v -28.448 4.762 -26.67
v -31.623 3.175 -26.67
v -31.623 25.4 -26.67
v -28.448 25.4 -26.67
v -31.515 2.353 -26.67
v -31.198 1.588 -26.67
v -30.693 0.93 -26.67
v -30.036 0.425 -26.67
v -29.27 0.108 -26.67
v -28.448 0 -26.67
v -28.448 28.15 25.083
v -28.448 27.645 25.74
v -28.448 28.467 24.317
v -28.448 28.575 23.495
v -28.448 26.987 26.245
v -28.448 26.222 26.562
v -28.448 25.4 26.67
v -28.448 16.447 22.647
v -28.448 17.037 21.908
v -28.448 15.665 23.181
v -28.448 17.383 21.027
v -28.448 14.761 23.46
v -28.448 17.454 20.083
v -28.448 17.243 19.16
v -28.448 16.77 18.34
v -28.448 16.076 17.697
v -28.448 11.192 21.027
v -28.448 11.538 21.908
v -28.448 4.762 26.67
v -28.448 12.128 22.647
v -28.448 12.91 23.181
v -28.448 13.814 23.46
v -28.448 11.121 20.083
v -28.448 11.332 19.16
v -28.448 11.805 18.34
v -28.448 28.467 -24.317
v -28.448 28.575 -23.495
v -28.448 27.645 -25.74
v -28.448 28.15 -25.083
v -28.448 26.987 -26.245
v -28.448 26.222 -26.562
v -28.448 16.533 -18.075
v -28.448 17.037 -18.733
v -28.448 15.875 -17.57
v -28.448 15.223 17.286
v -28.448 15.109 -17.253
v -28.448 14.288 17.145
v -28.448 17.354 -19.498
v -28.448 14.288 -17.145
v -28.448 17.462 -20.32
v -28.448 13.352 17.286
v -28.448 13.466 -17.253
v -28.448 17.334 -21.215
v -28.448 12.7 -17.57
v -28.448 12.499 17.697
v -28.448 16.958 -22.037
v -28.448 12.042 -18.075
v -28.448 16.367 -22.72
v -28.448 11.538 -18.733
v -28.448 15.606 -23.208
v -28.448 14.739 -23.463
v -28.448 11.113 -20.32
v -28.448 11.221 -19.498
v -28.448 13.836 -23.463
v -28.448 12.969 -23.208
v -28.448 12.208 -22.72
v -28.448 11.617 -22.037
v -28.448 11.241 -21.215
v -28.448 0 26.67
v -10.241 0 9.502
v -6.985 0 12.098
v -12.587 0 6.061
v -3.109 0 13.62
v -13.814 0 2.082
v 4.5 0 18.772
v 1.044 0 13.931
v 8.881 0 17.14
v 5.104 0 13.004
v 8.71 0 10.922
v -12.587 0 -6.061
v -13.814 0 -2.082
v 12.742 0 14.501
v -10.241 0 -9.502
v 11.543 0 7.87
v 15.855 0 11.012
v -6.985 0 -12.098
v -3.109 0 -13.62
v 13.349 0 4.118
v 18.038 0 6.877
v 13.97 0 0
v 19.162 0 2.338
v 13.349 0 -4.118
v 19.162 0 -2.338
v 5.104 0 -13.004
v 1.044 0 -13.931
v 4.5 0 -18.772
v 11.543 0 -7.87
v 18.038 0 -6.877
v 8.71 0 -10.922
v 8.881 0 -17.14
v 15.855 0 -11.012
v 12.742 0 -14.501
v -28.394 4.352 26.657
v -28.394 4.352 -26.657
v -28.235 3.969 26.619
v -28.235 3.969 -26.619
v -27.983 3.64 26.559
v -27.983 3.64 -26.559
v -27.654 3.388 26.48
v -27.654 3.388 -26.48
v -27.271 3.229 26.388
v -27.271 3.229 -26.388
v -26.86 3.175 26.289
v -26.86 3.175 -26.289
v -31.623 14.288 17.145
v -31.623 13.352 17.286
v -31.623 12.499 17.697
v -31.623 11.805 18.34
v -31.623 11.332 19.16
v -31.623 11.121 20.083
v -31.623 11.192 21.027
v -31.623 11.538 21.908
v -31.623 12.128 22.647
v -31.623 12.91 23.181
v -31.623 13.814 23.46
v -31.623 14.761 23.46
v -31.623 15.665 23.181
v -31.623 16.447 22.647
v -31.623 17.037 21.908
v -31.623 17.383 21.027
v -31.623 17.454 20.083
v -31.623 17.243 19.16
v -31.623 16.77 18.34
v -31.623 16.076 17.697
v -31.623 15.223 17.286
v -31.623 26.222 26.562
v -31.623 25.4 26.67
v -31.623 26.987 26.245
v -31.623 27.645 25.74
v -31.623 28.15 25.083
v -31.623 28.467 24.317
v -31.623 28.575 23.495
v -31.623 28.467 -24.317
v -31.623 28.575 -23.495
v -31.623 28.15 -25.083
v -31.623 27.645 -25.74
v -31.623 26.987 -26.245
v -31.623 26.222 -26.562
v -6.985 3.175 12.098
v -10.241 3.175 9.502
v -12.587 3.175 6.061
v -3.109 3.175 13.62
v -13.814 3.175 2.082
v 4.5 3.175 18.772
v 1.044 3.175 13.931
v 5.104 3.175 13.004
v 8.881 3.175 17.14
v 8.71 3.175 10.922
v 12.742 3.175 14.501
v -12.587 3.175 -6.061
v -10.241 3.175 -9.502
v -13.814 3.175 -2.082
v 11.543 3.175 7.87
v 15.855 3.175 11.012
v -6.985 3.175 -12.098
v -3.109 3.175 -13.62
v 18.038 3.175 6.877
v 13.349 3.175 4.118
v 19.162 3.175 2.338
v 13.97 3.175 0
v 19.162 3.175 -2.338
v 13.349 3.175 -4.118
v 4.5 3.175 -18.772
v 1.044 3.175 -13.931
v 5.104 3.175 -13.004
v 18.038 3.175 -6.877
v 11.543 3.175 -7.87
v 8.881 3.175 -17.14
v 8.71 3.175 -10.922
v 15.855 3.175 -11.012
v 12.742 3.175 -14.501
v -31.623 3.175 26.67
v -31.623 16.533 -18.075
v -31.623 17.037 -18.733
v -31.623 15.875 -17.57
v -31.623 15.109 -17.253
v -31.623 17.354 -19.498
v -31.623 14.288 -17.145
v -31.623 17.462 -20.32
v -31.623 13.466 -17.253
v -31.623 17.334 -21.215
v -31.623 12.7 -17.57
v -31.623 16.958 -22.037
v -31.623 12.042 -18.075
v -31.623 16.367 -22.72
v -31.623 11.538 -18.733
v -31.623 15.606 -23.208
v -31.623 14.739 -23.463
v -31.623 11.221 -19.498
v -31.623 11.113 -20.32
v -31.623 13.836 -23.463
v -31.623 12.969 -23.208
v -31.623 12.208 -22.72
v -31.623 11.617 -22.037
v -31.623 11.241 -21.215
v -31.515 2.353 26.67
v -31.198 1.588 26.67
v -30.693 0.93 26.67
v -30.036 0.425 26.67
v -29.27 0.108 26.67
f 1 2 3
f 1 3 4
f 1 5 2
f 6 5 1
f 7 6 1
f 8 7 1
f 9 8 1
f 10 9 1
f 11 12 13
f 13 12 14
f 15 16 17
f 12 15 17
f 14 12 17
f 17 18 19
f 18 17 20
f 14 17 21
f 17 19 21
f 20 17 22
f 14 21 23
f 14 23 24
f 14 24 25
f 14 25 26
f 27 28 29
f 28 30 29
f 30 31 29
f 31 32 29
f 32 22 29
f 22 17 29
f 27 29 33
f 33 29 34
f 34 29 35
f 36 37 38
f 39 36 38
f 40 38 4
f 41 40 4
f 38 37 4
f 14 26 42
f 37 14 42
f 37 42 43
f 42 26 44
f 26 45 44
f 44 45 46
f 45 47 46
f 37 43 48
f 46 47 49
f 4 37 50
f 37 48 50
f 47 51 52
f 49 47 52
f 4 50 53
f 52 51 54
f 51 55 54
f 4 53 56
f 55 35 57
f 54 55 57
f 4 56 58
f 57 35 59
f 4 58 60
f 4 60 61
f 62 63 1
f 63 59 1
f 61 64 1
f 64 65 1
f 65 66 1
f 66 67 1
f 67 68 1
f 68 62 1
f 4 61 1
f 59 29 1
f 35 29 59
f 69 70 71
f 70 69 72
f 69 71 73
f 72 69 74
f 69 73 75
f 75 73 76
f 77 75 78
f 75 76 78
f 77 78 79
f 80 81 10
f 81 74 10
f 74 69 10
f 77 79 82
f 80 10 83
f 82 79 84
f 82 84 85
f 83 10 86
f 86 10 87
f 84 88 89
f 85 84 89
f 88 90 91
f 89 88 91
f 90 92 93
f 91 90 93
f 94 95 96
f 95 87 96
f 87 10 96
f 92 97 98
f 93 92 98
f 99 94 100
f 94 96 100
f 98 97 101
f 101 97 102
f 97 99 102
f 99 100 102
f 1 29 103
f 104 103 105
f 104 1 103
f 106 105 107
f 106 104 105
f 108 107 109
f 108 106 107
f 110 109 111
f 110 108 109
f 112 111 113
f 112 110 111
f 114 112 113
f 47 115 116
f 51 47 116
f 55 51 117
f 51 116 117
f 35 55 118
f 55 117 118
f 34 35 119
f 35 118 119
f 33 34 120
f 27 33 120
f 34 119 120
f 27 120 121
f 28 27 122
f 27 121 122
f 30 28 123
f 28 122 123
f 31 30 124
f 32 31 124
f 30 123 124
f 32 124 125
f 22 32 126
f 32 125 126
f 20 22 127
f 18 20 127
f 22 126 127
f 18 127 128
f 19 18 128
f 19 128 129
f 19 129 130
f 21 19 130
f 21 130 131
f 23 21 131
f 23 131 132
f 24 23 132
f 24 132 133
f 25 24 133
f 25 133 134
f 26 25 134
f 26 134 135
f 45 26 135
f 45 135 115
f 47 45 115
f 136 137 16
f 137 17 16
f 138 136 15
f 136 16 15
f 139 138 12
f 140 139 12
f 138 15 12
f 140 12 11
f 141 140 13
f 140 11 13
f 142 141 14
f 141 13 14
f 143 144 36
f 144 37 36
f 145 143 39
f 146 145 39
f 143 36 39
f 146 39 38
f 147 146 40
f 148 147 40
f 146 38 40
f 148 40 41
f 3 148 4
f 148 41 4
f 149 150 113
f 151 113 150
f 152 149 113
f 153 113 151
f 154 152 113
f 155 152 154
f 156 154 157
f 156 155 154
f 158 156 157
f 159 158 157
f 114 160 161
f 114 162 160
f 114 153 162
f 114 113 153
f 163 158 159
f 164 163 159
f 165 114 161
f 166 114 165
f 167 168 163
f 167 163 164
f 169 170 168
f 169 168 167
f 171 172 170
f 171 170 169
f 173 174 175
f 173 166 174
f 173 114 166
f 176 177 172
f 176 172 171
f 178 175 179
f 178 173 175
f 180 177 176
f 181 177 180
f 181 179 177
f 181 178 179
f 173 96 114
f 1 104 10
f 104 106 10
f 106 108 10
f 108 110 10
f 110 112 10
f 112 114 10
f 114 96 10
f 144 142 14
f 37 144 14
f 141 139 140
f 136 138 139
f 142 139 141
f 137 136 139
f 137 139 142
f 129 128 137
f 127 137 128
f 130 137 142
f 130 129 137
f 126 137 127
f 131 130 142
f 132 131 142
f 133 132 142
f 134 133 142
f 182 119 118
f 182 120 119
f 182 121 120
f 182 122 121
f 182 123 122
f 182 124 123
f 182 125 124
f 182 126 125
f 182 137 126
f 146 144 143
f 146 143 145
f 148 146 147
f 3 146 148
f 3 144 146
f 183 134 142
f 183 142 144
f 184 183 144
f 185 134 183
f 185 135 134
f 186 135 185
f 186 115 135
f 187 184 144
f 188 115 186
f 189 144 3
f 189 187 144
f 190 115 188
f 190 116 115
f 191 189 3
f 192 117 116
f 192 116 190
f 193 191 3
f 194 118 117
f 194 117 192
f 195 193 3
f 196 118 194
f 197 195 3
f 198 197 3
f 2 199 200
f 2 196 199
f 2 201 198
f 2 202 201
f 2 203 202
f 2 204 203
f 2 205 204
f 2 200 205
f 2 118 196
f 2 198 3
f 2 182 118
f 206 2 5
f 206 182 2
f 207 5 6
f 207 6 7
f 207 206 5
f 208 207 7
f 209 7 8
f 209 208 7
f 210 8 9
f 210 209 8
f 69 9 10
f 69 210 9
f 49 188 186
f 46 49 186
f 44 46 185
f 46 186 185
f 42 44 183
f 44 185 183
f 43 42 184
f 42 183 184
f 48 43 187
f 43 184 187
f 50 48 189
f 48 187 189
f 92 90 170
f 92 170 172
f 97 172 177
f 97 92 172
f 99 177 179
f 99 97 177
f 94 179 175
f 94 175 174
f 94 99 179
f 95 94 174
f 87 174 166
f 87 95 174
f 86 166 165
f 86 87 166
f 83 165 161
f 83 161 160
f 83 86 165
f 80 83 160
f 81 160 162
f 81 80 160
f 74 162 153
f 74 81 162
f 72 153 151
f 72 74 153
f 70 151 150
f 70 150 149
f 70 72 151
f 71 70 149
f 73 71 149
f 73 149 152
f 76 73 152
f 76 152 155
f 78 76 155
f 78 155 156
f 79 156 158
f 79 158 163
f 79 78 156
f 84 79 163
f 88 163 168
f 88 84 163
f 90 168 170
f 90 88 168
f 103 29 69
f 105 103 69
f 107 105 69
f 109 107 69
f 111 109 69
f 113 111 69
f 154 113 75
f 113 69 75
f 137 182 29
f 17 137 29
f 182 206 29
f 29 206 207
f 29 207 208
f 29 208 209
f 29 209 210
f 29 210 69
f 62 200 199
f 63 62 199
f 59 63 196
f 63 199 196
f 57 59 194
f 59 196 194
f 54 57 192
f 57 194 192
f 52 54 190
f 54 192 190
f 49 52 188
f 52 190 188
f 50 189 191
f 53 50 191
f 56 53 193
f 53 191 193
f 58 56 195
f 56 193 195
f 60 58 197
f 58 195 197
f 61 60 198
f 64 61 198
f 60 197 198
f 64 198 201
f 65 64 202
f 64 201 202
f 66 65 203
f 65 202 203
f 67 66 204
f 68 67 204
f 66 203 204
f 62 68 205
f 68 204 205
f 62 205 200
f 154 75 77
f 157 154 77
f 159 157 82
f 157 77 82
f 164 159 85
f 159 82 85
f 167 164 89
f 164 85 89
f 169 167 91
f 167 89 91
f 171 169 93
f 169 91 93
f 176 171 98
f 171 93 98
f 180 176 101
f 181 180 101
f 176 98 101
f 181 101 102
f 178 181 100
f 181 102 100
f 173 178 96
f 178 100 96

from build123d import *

# Parameters (mm, degrees)
SKETCH1_R           = 13.97
BOSS_EXTRUDE1_DEPTH = 3.175
SKETCH2_W           = 3.175
SKETCH2_H           = 53.34
BOSS_EXTRUDE2_DEPTH = 25.4
CUT_EXTRUDE1_DEPTH  = 51.927
FILLET1_R           = 1.5875
FILLET2_R           = 3.175
FILLET3_R           = 3.175


with BuildPart() as part:
    # Sketch1 → Boss-Extrude1 (new body)
    with BuildSketch(Plane(origin=(0, 0, 0), x_dir=(1, 0, 0), z_dir=(0, 1, 0))):
        with BuildLine():
            ThreePointArc((4.499810369, -18.772216775), (19.304, 0), (4.499810369, 18.772216775))
            Line((4.499810369, 18.772216775), (-28.448, 26.67))
            Line((-28.448, 26.67), (-31.623, 26.67))
            Line((-31.623, 26.67), (-31.623, -26.67))
            Line((-31.623, -26.67), (-28.448, -26.67))
            Line((-28.448, -26.67), (4.499810369, -18.772216775))
        make_face()
        Circle(SKETCH1_R, mode=Mode.SUBTRACT)
    extrude(amount=BOSS_EXTRUDE1_DEPTH)

    # Sketch2 → Boss-Extrude2 (add)
    with BuildSketch(Plane(origin=(0, 3.175, 0), x_dir=(1, 0, 0), z_dir=(0, 1, 0))):
        with Locations((-30.0355, 0)):
            Rectangle(SKETCH2_W, SKETCH2_H)
    extrude(amount=BOSS_EXTRUDE2_DEPTH)

    # Sketch6 → Cut-Extrude1 (cut, through all)
    with BuildSketch(Plane.ZY.offset(31.623)):
        with BuildLine():
            Line((-20.32, 11.1125), (-20.32, 14.2875))
            Line((-20.32, 14.2875), (-20.32, 17.4625))
            ThreePointArc((-20.32, 17.4625), (-23.495, 14.2875), (-20.32, 11.1125))
        make_face()
        with BuildLine():
            ThreePointArc((-20.32, 11.1125), (-18.07493597, 12.04243597), (-17.145, 14.2875))
            Line((-17.145, 14.2875), (-20.32, 14.2875))
            Line((-20.32, 14.2875), (-20.32, 11.1125))
        make_face()
        with BuildLine():
            Line((-20.32, 14.2875), (-17.145, 14.2875))
            ThreePointArc((-17.145, 14.2875), (-18.07493597, 16.53256403), (-20.32, 17.4625))
            Line((-20.32, 17.4625), (-20.32, 14.2875))
        make_face()
        with BuildLine():
            ThreePointArc((23.495, 14.2875), (20.32, 17.4625), (17.145, 14.2875))
            Line((17.145, 14.2875), (20.32, 14.2875))
            Line((20.32, 14.2875), (23.495, 14.2875))
        make_face()
        with BuildLine():
            Line((20.32, 14.2875), (17.145, 14.2875))
            ThreePointArc((17.145, 14.2875), (20.32, 11.1125), (23.495, 14.2875))
            Line((23.495, 14.2875), (20.32, 14.2875))
        make_face()
    extrude(amount=-CUT_EXTRUDE1_DEPTH, mode=Mode.SUBTRACT)

    # Fillet1
    fillet1_edges = [part.edges().sort_by_distance(p)[0] for p in [
        (-28.448, 3.175, 0),
    ]]
    fillet(fillet1_edges, radius=FILLET1_R)

    # Fillet2
    fillet2_edges = [part.edges().sort_by_distance(p)[0] for p in [
        (-31.623, 0, 0),
    ]]
    fillet(fillet2_edges, radius=FILLET2_R)

    # Fillet3
    fillet3_edges = [part.edges().sort_by_distance(p)[0] for p in [
        (-30.0355, 28.575, -26.67),
        (-30.0355, 28.575, 26.67),
    ]]
    fillet(fillet3_edges, radius=FILLET3_R)


solid = part.part
